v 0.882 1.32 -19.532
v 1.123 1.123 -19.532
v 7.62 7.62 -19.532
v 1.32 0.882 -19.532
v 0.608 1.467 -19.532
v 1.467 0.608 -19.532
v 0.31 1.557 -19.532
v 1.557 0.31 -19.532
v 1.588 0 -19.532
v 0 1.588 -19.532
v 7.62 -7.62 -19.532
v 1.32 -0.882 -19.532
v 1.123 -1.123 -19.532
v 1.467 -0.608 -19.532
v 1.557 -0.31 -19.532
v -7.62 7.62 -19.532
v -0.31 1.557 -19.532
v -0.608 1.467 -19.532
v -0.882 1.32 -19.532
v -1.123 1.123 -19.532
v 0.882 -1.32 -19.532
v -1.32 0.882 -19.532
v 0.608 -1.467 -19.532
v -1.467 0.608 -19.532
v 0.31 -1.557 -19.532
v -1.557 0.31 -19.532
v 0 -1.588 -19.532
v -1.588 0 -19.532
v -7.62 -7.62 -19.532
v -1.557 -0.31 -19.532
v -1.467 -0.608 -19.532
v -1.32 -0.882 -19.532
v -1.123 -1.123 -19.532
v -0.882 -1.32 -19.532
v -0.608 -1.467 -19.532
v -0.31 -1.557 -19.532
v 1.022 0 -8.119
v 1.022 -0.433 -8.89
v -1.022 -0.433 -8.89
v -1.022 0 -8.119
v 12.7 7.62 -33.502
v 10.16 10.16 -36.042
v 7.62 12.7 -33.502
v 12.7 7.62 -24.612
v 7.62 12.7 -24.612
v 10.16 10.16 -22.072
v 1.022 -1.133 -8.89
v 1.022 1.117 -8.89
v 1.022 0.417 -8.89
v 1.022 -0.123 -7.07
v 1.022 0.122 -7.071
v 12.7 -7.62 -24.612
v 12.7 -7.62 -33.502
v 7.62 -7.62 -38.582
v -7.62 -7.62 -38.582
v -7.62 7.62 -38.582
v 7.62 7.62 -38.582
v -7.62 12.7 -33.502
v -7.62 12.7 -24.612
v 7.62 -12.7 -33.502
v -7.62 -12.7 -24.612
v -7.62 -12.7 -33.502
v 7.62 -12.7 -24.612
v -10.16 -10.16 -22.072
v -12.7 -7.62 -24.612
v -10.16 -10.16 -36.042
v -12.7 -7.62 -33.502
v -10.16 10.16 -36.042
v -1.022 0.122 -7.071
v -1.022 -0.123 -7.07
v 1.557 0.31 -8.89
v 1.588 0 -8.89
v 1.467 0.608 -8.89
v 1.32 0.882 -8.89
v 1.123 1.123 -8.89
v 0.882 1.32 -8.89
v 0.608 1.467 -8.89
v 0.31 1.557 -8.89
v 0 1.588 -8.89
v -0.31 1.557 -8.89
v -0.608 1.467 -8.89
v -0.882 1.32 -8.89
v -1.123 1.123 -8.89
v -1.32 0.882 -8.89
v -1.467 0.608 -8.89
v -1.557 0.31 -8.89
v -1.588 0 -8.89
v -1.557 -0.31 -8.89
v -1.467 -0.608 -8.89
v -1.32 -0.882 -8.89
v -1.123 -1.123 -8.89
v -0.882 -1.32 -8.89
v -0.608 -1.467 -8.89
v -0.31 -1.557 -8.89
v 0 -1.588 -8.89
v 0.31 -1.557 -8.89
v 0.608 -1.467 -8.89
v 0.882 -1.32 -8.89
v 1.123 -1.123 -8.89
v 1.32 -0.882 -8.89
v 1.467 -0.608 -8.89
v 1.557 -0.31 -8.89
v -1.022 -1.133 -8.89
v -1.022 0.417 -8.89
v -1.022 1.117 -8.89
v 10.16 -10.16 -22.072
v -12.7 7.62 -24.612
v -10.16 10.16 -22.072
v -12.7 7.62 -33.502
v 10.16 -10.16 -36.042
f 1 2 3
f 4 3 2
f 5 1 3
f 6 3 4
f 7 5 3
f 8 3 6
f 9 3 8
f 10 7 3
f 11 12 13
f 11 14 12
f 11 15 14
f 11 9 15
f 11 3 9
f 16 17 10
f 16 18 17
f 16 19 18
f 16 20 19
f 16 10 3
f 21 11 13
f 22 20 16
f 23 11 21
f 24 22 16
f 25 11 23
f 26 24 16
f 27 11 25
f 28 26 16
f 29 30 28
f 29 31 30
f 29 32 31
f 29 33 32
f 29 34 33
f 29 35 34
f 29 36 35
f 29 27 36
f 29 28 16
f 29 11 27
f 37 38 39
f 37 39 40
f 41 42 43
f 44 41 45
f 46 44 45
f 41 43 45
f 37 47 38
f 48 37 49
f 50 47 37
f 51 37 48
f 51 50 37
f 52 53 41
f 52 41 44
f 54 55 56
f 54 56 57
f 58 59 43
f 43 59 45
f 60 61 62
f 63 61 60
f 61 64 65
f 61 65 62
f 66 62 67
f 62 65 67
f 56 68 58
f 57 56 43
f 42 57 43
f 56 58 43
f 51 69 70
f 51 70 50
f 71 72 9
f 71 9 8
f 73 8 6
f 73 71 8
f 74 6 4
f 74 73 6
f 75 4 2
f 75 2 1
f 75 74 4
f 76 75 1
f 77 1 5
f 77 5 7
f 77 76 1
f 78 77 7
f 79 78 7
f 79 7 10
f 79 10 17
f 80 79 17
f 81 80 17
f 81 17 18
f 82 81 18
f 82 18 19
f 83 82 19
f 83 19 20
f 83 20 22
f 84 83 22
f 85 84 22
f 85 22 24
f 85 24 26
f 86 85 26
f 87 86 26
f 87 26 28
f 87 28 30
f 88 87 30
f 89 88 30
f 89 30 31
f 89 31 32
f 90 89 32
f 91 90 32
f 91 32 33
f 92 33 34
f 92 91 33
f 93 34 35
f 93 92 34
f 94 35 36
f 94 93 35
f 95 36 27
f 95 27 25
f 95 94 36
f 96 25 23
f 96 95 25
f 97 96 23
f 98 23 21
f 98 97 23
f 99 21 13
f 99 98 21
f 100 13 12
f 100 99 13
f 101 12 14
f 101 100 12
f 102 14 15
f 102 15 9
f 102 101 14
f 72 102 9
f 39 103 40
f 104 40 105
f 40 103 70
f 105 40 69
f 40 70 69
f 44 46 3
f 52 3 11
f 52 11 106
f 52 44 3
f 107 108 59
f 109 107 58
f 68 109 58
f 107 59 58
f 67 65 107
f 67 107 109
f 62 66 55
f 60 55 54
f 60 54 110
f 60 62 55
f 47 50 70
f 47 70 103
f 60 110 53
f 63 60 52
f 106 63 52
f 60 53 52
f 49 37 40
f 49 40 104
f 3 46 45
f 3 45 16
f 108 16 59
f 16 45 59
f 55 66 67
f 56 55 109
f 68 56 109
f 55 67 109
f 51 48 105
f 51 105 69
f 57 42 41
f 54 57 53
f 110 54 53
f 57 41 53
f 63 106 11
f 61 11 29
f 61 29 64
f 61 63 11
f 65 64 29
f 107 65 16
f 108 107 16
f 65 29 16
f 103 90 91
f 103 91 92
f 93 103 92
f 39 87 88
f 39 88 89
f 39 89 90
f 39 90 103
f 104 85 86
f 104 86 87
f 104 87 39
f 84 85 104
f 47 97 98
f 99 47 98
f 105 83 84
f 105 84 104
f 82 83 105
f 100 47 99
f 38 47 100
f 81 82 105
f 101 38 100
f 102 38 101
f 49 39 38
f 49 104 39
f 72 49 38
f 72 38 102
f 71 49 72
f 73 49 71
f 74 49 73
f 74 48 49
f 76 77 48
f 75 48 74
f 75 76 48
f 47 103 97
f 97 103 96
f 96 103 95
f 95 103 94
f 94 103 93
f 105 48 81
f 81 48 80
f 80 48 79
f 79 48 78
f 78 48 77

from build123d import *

# Parameters (mm, degrees)
F1_DEPTH = 12.7
F2_SIZE  = 5.08
F4_R     = 1.5875
F5_DEPTH = 11.73114
F6_SIZE  = 5.08
F8_DEPTH = 1.02158
F9_SIZE  = 0.254


with BuildPart() as f1:
    # F0 (on Front) → F1 (new body, symmetric)
    with BuildSketch(Plane.XZ):
        Polygon((-12.7, -38.581686), (0, -38.581686), (12.7, -38.581686), (12.7, -19.531686), (0, -19.531686), (-12.7, -19.531686), align=None)
    extrude(amount=F1_DEPTH, both=True)

    # F2
    f2_edges = [f1.edges().sort_by_distance(p)[0] for p in [
        (0, -12.7, -19.531686),
        (12.7, 0, -19.531686),
        (-12.7, 0, -19.531686),
        (0, 12.7, -19.531686),
        (-12.7, 0, -38.581686),
        (0, -12.7, -38.581686),
        (12.7, 0, -38.581686),
        (0, 12.7, -38.581686),
    ]]
    chamfer(f2_edges, length=F2_SIZE)

    # F4 (on offset) → F5 (join)
    with BuildSketch(Plane.XY.offset(-8.89)):
        Circle(F4_R)
    extrude(amount=-F5_DEPTH)

    # F6
    f6_edges = [f1.edges().sort_by_distance(p)[0] for p in [
        (-12.7, 12.7, -29.056686),
        (12.7, 12.7, -29.056686),
        (12.7, -12.7, -29.056686),
        (-12.7, -12.7, -29.056686),
    ]]
    chamfer(f6_edges, length=F6_SIZE)

    # F7 (on Right) → F8 (join, symmetric)
    with BuildSketch(Plane.YZ):
        Polygon((0.430685, -8.915657), (1.130668, -8.915657), (0, -6.847987), (-1.14363, -8.908516), (-0.443647, -8.908516), (0, -8.118563), align=None)
    extrude(amount=F8_DEPTH, both=True)

    # F9
    f9_edges = [f1.edges().sort_by_distance(p)[0] for p in [
        (0, 0, -6.847987),
    ]]
    chamfer(f9_edges, length=F9_SIZE)


solid = f1.part
